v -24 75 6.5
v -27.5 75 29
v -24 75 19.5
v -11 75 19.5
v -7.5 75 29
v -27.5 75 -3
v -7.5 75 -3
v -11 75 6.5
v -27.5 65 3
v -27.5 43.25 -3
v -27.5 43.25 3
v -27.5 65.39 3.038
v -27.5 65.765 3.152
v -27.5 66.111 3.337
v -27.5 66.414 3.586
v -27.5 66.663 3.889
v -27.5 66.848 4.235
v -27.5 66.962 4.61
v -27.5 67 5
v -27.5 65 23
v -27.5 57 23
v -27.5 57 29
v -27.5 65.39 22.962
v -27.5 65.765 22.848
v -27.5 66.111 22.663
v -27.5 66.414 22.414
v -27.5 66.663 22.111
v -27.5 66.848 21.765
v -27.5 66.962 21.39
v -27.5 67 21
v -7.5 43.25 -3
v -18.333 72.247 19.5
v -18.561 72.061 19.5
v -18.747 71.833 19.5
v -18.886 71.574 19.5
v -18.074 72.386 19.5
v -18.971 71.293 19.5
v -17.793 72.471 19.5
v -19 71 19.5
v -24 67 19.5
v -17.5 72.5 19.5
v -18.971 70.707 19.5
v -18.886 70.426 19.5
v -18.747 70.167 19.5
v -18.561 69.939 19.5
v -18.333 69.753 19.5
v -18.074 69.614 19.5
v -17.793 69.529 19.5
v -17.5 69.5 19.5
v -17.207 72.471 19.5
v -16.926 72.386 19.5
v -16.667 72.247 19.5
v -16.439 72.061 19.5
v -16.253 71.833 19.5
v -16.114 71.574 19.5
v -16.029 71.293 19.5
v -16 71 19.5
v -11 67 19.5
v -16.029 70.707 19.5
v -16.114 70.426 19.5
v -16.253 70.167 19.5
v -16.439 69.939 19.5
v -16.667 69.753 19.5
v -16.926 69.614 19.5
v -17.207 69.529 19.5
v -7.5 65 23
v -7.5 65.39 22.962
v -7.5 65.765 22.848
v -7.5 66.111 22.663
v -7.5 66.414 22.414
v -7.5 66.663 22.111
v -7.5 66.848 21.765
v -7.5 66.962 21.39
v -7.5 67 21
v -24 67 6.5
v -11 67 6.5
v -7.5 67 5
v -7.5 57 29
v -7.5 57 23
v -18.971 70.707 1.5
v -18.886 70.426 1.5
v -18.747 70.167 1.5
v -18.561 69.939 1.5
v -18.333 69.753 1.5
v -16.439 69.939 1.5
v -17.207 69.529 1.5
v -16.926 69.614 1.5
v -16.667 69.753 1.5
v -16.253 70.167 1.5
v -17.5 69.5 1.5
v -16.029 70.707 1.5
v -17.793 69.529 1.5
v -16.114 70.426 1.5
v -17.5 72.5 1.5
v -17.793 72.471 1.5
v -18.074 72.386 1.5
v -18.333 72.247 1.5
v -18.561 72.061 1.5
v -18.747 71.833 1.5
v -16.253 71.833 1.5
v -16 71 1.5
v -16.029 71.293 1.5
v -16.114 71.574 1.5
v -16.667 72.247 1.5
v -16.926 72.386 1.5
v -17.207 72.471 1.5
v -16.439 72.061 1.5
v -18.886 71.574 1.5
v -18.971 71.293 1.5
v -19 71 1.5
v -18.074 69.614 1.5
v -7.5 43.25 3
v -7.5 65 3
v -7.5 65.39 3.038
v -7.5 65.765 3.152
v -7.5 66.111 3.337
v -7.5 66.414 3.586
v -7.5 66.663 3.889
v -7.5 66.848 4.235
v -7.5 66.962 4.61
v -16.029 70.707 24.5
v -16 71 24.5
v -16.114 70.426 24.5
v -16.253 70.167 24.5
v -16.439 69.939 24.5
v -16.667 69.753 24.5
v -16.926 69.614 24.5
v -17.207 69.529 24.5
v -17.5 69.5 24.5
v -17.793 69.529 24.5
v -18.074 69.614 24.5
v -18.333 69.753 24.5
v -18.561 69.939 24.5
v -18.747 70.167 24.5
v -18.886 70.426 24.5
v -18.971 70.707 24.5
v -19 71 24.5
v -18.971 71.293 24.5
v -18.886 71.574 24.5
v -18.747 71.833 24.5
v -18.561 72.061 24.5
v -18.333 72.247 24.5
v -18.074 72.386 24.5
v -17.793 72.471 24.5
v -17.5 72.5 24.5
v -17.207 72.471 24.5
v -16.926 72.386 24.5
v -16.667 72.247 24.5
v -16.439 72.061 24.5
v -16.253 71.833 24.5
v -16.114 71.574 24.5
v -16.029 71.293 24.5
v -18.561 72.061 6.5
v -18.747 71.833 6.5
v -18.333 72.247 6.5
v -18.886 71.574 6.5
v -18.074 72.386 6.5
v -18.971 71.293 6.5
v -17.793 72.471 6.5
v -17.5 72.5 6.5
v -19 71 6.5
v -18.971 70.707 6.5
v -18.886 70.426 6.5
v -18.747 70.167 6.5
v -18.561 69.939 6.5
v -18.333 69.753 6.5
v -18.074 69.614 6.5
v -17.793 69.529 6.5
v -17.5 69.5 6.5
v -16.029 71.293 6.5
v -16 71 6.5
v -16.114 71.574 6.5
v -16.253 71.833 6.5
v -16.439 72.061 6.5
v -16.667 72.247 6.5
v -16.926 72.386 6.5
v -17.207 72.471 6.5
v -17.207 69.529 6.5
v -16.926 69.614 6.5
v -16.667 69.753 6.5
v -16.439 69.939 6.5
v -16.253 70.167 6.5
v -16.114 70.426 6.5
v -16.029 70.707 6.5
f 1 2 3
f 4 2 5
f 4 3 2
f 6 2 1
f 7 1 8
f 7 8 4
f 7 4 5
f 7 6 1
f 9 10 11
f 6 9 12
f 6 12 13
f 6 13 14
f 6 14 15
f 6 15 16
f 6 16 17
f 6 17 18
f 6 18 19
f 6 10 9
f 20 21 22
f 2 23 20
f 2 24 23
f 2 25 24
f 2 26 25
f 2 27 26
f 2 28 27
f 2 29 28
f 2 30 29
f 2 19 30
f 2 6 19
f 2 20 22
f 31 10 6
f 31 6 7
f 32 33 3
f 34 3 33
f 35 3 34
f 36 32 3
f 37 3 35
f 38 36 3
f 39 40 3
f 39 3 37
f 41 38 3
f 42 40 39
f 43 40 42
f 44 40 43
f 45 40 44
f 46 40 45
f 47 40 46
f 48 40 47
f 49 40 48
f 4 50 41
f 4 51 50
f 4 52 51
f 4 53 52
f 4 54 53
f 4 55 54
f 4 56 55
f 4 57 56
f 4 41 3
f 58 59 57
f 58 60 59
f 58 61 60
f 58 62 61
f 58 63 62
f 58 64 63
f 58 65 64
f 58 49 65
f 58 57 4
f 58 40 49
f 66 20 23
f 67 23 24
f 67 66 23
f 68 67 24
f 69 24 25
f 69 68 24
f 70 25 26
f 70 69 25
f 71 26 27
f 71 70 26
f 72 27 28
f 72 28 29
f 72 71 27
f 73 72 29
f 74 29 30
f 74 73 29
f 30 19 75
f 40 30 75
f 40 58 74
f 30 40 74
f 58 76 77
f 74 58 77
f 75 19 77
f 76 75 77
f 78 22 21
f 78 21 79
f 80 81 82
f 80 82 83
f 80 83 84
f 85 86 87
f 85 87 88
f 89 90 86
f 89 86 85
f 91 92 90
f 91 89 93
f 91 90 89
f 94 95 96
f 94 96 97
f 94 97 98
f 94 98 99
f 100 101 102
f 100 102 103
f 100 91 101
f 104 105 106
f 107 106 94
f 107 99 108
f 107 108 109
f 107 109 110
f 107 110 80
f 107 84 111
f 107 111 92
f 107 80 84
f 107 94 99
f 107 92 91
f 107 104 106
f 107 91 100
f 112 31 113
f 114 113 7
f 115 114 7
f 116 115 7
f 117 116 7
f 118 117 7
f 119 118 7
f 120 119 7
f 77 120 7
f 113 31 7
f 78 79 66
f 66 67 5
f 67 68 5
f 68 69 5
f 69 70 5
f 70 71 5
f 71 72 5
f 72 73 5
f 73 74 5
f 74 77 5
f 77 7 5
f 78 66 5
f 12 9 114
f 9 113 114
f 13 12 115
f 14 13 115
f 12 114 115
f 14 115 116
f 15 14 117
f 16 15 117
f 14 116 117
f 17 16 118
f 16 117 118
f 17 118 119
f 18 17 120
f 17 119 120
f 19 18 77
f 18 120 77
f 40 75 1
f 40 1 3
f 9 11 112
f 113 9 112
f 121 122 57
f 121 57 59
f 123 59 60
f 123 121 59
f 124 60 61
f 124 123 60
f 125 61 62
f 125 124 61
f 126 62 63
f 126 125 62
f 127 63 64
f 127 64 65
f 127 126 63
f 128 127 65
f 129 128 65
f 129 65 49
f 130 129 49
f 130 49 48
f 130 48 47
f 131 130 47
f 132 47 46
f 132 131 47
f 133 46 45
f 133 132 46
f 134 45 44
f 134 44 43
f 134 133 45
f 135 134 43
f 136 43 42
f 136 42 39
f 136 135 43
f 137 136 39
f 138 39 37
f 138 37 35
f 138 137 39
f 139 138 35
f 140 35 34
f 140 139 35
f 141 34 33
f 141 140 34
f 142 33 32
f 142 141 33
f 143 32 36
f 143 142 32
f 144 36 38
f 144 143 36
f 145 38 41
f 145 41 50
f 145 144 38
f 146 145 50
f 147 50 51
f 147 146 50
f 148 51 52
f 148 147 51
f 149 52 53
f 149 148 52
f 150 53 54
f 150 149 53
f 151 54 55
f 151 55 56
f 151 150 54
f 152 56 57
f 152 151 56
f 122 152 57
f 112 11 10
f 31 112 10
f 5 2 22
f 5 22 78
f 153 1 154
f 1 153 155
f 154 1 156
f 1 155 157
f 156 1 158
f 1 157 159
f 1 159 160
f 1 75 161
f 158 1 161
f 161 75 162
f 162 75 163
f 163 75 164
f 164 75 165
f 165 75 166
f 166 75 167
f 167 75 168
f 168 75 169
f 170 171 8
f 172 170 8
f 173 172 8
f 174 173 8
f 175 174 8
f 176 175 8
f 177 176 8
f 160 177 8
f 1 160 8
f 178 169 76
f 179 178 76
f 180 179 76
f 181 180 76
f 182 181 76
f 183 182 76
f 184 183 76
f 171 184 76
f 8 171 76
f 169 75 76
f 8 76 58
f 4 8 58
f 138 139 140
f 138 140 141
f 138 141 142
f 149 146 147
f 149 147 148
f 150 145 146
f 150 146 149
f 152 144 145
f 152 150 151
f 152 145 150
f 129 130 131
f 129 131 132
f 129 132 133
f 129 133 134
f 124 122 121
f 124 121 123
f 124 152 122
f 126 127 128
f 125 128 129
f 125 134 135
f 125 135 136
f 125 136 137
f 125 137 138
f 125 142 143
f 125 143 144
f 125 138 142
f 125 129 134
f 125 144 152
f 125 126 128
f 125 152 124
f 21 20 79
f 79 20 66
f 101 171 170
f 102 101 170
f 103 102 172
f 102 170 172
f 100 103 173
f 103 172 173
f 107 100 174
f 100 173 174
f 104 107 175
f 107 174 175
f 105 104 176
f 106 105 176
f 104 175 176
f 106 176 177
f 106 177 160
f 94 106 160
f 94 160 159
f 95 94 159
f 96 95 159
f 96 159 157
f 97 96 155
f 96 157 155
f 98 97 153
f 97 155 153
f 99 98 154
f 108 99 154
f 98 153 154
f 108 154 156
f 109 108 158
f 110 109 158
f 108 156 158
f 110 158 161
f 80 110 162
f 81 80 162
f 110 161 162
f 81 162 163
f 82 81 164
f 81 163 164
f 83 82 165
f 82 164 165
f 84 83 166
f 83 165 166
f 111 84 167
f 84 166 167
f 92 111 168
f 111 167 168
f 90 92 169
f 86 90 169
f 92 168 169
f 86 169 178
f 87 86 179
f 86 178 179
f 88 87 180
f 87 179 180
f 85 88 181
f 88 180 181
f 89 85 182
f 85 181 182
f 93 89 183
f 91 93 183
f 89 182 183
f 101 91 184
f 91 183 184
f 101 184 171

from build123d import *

# Parameters (mm, degrees)
SKETCH1_W           = 20
SKETCH1_H           = 6
BOSS_EXTRUDE1_DEPTH = 75
SKETCH2_W           = 20
SKETCH2_H           = 8
BOSS_EXTRUDE2_DEPTH = 26
SKETCH3_W           = 20
SKETCH3_H           = 6
BOSS_EXTRUDE3_DEPTH = 10
SKETCH6_W           = 13
SKETCH6_H           = 13
CUT_EXTRUDE1_DEPTH  = 79.014421744
SKETCH8_R           = 1.5
CUT_EXTRUDE3_DEPTH  = 5
CUT_EXTRUDE4_START  = -5
SKETCH9_R           = 1.5
CUT_EXTRUDE4_DEPTH  = 5
FILLET1_R           = 2
SKETCH10_W          = 6
SKETCH10_H          = 44.050587659
CUT_EXTRUDE5_DEPTH  = 20


with BuildPart() as part:
    # Sketch1 → Boss-Extrude1 (new body)
    with BuildSketch(Plane(origin=(0, 0, 0), x_dir=(1, 0, 0), z_dir=(0, 1, 0))):
        with Locations((-17.5, 0)):
            Rectangle(SKETCH1_W, SKETCH1_H)
    extrude(amount=BOSS_EXTRUDE1_DEPTH)

    # Sketch2 → Boss-Extrude2 (add)
    with BuildSketch(Plane.XY.offset(3)):
        with Locations((-17.5, 71)):
            Rectangle(SKETCH2_W, SKETCH2_H)
    extrude(amount=BOSS_EXTRUDE2_DEPTH)

    # Sketch3 → Boss-Extrude3 (add)
    with BuildSketch(Plane.XZ.offset(-67)):
        with Locations((-17.5, 26)):
            Rectangle(SKETCH3_W, SKETCH3_H)
    extrude(amount=BOSS_EXTRUDE3_DEPTH)

    # Sketch6 → Cut-Extrude1 (cut, through all)
    with BuildSketch(Plane.XZ.offset(-67)):
        with Locations((-17.5, 13)):
            Rectangle(SKETCH6_W, SKETCH6_H)
    extrude(amount=-CUT_EXTRUDE1_DEPTH, mode=Mode.SUBTRACT)

    # Sketch8 → Cut-Extrude3 (cut)
    with BuildSketch(Plane.XY.offset(6.5)):
        with Locations((-17.5, 71)):
            Circle(SKETCH8_R)
    extrude(amount=-CUT_EXTRUDE3_DEPTH, mode=Mode.SUBTRACT)

    # Sketch9 → Cut-Extrude4 (cut)
    with BuildSketch(Plane(origin=(0, 0, 19.5), x_dir=(-1, 0, 0), z_dir=(0, 0, -1)).offset(CUT_EXTRUDE4_START)):
        with Locations(Location((17.5, 71, 0), (0, 0, 180))):
            Circle(SKETCH9_R)
    extrude(amount=CUT_EXTRUDE4_DEPTH, mode=Mode.SUBTRACT)

    # Fillet1
    fillet1_edges = [part.edges().sort_by_distance(p)[0] for p in [
        (-17.5, 67, 3),
        (-17.5, 67, 23),
    ]]
    fillet(fillet1_edges, radius=FILLET1_R)

    # Sketch10 → Cut-Extrude5 (cut)
    with BuildSketch(Plane(origin=(-7.5, 0, 0), x_dir=(0, 0, -1), z_dir=(1, 0, 0))):
        with Locations((0, 21.22470617)):
            Rectangle(SKETCH10_W, SKETCH10_H)
    extrude(amount=-CUT_EXTRUDE5_DEPTH, mode=Mode.SUBTRACT)


solid = part.part
